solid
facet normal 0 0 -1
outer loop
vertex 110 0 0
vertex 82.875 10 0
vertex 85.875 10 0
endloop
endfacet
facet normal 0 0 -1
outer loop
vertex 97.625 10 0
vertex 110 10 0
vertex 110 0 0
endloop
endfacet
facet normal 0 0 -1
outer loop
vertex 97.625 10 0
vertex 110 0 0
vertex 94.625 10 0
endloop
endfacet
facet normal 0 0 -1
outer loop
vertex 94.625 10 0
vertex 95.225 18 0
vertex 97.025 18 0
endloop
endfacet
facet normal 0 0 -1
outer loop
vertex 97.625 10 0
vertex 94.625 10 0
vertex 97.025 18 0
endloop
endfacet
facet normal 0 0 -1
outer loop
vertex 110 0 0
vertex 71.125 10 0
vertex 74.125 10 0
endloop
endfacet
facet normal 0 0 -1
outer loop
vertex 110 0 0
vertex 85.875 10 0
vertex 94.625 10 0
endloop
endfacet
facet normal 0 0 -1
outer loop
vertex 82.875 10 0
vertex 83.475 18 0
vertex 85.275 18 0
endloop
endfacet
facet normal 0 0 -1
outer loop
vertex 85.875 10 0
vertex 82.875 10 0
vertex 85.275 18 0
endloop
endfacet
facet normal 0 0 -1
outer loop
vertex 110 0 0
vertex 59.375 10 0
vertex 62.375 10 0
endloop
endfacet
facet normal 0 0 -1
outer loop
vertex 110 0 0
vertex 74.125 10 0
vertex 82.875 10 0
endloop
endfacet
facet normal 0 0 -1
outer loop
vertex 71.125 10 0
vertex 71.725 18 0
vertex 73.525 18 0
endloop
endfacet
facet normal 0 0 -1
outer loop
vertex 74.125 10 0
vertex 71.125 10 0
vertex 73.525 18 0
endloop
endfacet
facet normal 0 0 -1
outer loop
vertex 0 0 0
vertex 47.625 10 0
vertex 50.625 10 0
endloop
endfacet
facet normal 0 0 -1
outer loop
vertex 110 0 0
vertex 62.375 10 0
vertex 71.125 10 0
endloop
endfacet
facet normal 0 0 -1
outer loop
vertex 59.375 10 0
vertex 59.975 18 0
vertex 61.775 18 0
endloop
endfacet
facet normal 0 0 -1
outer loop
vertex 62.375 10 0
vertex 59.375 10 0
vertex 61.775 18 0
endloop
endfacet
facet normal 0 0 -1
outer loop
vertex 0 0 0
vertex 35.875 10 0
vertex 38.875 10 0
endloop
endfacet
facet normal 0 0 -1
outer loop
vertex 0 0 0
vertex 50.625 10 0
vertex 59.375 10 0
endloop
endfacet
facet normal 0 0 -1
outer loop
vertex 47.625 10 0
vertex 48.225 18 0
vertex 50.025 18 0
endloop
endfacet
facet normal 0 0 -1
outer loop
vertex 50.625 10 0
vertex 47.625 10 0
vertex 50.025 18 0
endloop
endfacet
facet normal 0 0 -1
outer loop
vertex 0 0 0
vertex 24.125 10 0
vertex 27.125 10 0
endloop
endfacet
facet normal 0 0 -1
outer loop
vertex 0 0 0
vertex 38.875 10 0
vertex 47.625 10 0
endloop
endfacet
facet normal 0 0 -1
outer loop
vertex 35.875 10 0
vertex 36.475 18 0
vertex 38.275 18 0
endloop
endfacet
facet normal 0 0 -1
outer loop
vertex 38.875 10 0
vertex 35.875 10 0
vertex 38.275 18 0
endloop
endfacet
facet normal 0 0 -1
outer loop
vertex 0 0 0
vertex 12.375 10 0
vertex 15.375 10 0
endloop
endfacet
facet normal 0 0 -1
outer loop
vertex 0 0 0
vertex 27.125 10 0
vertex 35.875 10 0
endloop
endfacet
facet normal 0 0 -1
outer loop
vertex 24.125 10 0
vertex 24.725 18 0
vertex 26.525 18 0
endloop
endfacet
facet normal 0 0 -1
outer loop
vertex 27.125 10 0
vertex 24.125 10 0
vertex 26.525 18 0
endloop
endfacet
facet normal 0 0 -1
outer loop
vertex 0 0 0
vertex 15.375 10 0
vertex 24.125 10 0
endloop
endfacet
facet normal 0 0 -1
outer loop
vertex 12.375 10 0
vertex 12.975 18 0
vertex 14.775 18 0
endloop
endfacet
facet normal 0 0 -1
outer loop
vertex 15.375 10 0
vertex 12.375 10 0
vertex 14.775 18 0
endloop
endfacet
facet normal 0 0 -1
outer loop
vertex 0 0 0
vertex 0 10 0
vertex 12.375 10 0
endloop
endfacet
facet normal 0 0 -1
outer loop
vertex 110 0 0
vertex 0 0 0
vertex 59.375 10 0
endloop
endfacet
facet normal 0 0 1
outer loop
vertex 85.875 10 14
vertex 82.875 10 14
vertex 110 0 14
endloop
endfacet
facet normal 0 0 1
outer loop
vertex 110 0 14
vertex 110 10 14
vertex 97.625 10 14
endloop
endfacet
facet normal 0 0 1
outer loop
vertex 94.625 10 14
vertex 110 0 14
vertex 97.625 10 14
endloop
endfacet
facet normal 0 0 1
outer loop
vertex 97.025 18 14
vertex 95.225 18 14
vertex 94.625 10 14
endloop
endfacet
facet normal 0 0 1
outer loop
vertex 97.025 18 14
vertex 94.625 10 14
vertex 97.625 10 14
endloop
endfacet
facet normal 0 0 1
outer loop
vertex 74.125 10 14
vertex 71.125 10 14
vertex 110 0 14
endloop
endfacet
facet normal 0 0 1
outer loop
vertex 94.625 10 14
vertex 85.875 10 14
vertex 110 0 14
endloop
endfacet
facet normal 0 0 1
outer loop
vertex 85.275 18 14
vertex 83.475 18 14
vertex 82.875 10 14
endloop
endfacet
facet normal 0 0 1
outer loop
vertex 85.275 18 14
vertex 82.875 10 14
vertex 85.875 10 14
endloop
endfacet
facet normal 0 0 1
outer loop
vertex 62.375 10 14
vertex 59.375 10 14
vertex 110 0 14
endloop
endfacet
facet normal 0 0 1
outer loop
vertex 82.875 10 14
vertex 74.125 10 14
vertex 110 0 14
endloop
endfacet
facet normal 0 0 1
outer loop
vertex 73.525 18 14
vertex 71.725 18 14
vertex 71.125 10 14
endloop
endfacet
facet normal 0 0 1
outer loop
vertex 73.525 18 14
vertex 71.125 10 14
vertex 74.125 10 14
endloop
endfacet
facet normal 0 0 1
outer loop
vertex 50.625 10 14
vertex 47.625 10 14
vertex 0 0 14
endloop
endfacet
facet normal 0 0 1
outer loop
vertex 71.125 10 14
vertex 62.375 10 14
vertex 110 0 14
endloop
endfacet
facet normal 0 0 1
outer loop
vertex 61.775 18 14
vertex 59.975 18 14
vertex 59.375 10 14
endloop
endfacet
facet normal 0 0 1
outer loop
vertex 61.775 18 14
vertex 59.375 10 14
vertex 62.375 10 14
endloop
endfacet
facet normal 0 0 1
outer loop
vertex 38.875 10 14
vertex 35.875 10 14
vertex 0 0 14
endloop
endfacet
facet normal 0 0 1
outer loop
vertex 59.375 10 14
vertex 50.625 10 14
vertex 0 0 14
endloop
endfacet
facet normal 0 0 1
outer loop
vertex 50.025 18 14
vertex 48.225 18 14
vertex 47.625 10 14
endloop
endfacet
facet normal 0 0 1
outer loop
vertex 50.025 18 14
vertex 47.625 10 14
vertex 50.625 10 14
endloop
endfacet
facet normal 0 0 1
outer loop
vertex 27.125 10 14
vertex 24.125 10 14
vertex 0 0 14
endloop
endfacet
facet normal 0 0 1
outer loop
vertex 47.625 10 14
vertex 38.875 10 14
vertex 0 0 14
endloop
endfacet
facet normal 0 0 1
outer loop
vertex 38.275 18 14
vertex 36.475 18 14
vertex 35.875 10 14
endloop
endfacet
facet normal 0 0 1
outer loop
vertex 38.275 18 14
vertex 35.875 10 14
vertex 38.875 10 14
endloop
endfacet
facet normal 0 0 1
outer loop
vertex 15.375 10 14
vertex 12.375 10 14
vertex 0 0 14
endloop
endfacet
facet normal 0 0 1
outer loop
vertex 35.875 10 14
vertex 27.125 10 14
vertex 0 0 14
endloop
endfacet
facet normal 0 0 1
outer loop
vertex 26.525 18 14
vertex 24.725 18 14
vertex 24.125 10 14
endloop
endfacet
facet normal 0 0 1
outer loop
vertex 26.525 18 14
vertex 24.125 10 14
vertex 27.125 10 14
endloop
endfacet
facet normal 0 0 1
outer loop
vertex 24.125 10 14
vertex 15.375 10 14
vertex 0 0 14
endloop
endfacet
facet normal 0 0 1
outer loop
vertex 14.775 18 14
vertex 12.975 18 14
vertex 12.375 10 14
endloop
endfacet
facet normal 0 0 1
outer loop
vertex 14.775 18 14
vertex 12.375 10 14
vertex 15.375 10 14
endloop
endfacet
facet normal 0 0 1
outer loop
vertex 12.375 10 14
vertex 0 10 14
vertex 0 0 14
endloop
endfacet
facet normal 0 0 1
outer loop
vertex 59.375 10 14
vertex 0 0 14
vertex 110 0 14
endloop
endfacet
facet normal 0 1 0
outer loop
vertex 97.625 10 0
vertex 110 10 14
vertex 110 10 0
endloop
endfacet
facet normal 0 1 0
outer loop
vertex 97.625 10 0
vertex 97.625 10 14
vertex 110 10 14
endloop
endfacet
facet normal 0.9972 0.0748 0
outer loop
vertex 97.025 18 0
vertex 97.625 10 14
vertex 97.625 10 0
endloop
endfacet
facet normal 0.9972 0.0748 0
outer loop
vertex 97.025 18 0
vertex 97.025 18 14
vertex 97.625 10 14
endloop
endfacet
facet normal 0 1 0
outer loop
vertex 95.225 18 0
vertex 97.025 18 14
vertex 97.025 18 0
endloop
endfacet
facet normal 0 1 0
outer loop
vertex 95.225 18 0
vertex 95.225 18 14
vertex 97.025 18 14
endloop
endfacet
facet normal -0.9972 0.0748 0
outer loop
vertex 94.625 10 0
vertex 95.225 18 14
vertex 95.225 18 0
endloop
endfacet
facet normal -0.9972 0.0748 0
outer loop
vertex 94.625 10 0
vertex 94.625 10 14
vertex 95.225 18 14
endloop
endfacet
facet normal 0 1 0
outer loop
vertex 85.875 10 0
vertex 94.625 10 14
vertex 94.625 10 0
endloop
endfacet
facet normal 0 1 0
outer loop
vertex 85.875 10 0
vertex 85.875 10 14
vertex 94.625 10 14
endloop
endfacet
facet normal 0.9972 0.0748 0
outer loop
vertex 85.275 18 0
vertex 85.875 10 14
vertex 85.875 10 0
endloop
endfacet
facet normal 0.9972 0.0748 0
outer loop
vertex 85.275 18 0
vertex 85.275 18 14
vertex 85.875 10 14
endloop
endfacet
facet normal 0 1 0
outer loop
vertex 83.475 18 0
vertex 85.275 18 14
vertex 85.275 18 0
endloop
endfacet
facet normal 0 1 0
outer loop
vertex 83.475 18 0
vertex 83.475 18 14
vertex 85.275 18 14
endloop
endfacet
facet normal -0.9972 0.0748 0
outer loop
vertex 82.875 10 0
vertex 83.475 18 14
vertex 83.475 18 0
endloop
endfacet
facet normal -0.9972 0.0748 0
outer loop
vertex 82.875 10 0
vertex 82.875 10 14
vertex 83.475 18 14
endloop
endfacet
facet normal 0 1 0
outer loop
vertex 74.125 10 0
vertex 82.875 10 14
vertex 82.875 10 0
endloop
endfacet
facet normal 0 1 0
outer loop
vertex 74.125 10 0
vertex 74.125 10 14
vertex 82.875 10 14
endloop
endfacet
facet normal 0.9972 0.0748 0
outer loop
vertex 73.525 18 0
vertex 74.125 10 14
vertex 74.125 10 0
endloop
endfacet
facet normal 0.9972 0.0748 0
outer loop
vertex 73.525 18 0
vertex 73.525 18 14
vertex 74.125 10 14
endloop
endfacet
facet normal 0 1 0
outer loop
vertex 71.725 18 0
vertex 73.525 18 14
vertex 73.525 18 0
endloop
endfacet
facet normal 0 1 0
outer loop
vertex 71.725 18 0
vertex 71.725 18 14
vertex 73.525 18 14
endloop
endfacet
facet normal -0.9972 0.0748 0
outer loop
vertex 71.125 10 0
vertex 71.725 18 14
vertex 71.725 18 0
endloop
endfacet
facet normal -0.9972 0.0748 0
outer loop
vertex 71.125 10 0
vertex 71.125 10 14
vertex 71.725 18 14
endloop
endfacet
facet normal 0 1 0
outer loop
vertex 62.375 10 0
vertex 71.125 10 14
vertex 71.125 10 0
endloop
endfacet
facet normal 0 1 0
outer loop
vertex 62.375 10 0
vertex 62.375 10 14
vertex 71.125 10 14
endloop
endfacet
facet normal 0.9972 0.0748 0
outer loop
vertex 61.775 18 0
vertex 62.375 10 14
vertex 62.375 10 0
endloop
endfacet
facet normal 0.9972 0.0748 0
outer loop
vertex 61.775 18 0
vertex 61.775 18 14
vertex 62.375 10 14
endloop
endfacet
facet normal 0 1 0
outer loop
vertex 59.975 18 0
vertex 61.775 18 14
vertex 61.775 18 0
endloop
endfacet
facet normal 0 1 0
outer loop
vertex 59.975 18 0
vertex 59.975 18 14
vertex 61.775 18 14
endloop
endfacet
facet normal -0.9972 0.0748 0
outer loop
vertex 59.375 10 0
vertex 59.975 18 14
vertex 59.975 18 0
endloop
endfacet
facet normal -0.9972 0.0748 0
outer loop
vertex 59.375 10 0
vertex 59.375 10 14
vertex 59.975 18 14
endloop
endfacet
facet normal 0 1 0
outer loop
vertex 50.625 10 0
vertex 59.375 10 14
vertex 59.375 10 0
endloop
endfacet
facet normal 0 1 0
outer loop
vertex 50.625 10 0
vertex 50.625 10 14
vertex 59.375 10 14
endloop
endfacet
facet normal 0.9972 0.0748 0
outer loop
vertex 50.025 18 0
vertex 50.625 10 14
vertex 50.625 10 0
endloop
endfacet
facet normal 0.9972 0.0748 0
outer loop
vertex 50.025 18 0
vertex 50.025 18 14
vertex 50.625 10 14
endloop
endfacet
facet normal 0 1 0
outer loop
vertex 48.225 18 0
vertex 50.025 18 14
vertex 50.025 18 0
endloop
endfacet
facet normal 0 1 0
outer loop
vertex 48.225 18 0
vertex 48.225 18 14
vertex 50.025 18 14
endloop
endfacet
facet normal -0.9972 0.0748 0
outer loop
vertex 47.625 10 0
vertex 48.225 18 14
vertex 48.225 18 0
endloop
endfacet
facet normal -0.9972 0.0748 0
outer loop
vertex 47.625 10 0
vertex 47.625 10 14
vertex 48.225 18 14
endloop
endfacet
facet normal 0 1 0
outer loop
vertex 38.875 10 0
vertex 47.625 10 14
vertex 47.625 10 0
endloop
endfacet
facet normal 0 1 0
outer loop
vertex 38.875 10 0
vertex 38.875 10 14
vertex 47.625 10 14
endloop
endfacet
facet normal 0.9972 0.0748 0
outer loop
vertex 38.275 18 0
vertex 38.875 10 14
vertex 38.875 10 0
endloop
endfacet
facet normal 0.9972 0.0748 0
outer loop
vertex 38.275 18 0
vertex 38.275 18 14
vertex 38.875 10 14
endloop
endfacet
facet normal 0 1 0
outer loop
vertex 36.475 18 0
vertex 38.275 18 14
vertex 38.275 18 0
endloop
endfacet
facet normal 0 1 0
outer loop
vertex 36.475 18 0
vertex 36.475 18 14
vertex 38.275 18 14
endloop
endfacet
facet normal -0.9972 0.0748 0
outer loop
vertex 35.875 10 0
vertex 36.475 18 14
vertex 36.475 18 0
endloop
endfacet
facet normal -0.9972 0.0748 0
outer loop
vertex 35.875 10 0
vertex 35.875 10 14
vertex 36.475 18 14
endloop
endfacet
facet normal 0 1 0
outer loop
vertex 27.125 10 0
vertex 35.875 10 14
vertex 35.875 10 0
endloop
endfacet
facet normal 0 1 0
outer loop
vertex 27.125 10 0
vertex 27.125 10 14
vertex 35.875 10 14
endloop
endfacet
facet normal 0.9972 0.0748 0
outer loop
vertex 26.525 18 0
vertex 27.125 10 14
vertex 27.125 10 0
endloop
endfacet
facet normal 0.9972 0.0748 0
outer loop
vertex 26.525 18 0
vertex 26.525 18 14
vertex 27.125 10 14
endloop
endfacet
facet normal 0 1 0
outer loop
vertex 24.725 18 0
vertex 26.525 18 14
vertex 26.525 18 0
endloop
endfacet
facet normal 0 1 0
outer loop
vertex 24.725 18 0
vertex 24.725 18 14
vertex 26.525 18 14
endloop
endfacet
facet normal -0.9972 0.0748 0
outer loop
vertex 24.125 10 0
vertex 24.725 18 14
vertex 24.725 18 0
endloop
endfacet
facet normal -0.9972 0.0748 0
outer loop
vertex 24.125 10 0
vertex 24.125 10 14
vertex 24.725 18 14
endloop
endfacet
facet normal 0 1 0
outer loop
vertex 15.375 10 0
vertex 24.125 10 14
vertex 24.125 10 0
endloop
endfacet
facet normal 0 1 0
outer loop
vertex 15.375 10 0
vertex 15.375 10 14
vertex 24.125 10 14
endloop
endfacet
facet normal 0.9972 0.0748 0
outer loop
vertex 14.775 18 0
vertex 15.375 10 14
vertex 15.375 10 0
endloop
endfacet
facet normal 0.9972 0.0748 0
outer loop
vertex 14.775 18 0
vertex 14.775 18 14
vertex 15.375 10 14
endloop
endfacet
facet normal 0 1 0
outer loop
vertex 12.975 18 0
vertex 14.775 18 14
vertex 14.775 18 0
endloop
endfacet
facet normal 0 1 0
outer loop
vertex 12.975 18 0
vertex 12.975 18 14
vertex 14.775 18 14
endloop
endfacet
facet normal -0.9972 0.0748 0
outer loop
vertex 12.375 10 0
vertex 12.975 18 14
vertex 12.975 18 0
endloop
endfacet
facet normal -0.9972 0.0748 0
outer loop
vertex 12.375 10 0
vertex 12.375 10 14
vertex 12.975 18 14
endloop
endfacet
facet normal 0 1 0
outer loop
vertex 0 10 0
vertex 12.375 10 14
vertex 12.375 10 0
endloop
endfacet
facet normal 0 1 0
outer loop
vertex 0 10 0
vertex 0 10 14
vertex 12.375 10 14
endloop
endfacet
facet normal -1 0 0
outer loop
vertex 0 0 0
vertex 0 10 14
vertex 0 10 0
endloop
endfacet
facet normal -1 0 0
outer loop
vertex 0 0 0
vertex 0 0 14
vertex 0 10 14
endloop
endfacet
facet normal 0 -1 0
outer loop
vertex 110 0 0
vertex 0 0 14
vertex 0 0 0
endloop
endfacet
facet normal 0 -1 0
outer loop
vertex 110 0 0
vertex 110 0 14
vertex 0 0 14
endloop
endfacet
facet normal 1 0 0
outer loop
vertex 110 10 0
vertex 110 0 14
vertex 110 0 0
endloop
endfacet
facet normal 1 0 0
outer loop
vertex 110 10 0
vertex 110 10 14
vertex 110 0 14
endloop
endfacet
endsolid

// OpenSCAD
$fn = 32;

// ----------------------------------------------------------------------
// Gear rack: 8 teeth on a 110 mm bar, pitch 11.75 mm
// ----------------------------------------------------------------------

// --- parameters (mm) ---
profile_height = 14;      // extrusion height
profile_points = 36;      // points of the closed outline

profile = [[0, 0], [110, 0], [110, 10], [97.625, 10], [97.025, 18], [95.225, 18], [94.625, 10], [85.875, 10], [85.275, 18], [83.475, 18], [82.875, 10], [74.125, 10], [73.525, 18], [71.725, 18], [71.125, 10], [62.375, 10], [61.775, 18], [59.975, 18], [59.375, 10], [50.625, 10], [50.025, 18], [48.225, 18], [47.625, 10], [38.875, 10], [38.275, 18], [36.475, 18], [35.875, 10], [27.125, 10], [26.525, 18], [24.725, 18], [24.125, 10], [15.375, 10], [14.775, 18], [12.975, 18], [12.375, 10], [0, 10]];  // single closed polygon, 36 points, counter clockwise

// --- the one profile operation ---
linear_extrude(height = profile_height) polygon(points = profile);
